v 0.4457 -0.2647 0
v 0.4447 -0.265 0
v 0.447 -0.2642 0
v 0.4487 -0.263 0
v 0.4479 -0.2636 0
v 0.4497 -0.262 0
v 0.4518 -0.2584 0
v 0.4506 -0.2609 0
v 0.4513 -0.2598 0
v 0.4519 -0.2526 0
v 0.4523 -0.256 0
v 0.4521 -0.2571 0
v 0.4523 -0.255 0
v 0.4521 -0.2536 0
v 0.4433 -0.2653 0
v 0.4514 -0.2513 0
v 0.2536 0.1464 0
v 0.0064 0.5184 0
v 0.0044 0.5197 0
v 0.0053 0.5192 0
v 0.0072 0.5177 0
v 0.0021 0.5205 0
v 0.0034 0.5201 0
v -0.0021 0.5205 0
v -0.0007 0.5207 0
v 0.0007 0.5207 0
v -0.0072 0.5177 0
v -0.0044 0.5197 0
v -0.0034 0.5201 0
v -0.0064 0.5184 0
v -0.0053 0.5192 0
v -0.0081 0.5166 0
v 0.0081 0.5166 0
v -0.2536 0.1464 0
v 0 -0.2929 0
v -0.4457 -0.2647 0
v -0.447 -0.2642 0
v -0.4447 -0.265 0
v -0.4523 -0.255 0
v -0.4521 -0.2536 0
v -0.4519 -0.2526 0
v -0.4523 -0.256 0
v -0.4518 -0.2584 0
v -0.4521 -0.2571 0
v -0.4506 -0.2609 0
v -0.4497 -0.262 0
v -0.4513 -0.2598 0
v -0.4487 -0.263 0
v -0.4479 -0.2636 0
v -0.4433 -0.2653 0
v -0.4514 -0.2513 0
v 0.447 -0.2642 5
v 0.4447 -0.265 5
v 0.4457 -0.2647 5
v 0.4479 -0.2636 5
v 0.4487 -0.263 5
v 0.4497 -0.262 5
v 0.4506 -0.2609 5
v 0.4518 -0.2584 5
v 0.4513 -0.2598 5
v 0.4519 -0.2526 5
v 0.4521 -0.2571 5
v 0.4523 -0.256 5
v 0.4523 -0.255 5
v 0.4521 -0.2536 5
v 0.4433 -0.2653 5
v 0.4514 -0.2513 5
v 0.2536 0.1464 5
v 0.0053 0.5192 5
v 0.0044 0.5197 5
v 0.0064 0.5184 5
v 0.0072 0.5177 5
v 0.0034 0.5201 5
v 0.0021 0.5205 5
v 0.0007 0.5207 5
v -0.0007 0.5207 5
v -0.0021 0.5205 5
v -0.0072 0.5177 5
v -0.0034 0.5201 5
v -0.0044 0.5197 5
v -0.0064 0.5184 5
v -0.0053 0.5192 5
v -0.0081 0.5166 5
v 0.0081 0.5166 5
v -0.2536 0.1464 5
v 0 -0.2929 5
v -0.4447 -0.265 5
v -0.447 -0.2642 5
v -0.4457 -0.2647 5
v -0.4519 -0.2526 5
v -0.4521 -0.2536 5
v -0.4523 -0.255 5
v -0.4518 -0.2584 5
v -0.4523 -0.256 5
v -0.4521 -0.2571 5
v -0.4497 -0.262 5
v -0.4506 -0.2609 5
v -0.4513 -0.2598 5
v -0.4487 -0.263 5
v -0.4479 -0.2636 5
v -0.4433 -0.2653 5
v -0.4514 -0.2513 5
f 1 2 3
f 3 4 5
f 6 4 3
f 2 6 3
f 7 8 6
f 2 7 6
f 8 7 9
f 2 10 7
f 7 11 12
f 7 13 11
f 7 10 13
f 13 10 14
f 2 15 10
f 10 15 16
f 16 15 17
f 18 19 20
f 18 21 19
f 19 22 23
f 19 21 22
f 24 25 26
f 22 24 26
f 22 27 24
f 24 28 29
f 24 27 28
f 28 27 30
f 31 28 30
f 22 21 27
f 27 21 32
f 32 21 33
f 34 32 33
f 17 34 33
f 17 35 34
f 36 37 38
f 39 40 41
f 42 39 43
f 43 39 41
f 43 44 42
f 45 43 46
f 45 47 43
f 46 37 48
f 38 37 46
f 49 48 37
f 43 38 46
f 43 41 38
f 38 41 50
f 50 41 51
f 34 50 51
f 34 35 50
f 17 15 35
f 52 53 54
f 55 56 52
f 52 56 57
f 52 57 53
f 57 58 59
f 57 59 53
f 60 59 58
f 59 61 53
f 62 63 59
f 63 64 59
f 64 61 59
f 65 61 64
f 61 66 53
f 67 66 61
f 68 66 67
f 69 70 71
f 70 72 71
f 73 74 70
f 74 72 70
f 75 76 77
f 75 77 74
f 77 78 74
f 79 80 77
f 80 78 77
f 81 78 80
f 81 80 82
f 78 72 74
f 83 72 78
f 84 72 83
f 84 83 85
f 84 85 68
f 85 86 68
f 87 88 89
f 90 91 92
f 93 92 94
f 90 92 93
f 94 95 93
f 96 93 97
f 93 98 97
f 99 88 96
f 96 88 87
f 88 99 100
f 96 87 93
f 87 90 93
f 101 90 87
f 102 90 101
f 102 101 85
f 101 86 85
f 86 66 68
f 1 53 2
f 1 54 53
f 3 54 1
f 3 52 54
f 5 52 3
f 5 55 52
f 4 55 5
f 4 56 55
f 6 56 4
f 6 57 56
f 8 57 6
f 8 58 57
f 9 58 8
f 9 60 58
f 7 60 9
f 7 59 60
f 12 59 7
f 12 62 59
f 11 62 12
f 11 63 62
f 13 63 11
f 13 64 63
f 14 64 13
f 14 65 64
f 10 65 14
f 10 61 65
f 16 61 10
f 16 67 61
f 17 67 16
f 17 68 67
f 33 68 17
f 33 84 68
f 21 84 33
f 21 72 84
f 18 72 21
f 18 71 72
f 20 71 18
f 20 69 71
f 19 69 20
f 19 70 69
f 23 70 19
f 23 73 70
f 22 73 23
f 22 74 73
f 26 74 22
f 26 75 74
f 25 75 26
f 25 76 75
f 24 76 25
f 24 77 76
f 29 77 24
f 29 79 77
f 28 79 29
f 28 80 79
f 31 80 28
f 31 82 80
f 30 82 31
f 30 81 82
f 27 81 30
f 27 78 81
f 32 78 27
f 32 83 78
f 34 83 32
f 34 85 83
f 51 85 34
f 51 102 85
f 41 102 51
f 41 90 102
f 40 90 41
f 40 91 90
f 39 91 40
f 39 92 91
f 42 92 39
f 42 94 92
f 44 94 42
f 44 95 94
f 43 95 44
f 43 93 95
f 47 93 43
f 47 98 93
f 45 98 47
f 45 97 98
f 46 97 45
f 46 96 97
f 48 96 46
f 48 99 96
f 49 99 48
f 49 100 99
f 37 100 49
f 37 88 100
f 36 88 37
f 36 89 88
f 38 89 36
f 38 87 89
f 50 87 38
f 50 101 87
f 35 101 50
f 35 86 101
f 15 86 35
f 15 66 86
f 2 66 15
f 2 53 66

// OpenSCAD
// triangle base width including rounding
size = 1;
// radius of the edge rounding
rounding = .010;
//triangle side length w/o rounding
side = (size - rounding*2) + rounding/tan(30) * 2;
echo("side" ,side);
// triangle height w/o rounding
height = sqrt(3)/2 * side;
echo("height" ,height);

// right side of the top third triangle section
module section() {
    ox = 0;
    oy = 0;
    // length of the line from the center to a side (perpendicular)
    oa = sqrt(3)/3 * side/2;
    // point on the middle of the right side
    ax = ox + cos(30) * oa;
    ay = oy + sin(30) * oa;
    // length from triangle center to a corner
    raw_height = sqrt(pow(height/2,2) + pow(oa,2));
    rounding_center = raw_height - (side-size)/2 - rounding;
    echo("rounding_center", rounding_center);
    arc = [for (i=[30:2:90]) [
        cos(i)*rounding, 
        rounding_center + sin(i)*rounding
    ]];
    polygon(concat([[ox,oy],[ax,ay]], arc));
}
module third() {
    section();
    mirror([1,0,0])
    section();
}

module stick_profile() {
    for (i = [0,120,240]) {
        rotate([0,0,i])
        third();
    }
}
linear_extrude(5)
stick_profile();

section();
